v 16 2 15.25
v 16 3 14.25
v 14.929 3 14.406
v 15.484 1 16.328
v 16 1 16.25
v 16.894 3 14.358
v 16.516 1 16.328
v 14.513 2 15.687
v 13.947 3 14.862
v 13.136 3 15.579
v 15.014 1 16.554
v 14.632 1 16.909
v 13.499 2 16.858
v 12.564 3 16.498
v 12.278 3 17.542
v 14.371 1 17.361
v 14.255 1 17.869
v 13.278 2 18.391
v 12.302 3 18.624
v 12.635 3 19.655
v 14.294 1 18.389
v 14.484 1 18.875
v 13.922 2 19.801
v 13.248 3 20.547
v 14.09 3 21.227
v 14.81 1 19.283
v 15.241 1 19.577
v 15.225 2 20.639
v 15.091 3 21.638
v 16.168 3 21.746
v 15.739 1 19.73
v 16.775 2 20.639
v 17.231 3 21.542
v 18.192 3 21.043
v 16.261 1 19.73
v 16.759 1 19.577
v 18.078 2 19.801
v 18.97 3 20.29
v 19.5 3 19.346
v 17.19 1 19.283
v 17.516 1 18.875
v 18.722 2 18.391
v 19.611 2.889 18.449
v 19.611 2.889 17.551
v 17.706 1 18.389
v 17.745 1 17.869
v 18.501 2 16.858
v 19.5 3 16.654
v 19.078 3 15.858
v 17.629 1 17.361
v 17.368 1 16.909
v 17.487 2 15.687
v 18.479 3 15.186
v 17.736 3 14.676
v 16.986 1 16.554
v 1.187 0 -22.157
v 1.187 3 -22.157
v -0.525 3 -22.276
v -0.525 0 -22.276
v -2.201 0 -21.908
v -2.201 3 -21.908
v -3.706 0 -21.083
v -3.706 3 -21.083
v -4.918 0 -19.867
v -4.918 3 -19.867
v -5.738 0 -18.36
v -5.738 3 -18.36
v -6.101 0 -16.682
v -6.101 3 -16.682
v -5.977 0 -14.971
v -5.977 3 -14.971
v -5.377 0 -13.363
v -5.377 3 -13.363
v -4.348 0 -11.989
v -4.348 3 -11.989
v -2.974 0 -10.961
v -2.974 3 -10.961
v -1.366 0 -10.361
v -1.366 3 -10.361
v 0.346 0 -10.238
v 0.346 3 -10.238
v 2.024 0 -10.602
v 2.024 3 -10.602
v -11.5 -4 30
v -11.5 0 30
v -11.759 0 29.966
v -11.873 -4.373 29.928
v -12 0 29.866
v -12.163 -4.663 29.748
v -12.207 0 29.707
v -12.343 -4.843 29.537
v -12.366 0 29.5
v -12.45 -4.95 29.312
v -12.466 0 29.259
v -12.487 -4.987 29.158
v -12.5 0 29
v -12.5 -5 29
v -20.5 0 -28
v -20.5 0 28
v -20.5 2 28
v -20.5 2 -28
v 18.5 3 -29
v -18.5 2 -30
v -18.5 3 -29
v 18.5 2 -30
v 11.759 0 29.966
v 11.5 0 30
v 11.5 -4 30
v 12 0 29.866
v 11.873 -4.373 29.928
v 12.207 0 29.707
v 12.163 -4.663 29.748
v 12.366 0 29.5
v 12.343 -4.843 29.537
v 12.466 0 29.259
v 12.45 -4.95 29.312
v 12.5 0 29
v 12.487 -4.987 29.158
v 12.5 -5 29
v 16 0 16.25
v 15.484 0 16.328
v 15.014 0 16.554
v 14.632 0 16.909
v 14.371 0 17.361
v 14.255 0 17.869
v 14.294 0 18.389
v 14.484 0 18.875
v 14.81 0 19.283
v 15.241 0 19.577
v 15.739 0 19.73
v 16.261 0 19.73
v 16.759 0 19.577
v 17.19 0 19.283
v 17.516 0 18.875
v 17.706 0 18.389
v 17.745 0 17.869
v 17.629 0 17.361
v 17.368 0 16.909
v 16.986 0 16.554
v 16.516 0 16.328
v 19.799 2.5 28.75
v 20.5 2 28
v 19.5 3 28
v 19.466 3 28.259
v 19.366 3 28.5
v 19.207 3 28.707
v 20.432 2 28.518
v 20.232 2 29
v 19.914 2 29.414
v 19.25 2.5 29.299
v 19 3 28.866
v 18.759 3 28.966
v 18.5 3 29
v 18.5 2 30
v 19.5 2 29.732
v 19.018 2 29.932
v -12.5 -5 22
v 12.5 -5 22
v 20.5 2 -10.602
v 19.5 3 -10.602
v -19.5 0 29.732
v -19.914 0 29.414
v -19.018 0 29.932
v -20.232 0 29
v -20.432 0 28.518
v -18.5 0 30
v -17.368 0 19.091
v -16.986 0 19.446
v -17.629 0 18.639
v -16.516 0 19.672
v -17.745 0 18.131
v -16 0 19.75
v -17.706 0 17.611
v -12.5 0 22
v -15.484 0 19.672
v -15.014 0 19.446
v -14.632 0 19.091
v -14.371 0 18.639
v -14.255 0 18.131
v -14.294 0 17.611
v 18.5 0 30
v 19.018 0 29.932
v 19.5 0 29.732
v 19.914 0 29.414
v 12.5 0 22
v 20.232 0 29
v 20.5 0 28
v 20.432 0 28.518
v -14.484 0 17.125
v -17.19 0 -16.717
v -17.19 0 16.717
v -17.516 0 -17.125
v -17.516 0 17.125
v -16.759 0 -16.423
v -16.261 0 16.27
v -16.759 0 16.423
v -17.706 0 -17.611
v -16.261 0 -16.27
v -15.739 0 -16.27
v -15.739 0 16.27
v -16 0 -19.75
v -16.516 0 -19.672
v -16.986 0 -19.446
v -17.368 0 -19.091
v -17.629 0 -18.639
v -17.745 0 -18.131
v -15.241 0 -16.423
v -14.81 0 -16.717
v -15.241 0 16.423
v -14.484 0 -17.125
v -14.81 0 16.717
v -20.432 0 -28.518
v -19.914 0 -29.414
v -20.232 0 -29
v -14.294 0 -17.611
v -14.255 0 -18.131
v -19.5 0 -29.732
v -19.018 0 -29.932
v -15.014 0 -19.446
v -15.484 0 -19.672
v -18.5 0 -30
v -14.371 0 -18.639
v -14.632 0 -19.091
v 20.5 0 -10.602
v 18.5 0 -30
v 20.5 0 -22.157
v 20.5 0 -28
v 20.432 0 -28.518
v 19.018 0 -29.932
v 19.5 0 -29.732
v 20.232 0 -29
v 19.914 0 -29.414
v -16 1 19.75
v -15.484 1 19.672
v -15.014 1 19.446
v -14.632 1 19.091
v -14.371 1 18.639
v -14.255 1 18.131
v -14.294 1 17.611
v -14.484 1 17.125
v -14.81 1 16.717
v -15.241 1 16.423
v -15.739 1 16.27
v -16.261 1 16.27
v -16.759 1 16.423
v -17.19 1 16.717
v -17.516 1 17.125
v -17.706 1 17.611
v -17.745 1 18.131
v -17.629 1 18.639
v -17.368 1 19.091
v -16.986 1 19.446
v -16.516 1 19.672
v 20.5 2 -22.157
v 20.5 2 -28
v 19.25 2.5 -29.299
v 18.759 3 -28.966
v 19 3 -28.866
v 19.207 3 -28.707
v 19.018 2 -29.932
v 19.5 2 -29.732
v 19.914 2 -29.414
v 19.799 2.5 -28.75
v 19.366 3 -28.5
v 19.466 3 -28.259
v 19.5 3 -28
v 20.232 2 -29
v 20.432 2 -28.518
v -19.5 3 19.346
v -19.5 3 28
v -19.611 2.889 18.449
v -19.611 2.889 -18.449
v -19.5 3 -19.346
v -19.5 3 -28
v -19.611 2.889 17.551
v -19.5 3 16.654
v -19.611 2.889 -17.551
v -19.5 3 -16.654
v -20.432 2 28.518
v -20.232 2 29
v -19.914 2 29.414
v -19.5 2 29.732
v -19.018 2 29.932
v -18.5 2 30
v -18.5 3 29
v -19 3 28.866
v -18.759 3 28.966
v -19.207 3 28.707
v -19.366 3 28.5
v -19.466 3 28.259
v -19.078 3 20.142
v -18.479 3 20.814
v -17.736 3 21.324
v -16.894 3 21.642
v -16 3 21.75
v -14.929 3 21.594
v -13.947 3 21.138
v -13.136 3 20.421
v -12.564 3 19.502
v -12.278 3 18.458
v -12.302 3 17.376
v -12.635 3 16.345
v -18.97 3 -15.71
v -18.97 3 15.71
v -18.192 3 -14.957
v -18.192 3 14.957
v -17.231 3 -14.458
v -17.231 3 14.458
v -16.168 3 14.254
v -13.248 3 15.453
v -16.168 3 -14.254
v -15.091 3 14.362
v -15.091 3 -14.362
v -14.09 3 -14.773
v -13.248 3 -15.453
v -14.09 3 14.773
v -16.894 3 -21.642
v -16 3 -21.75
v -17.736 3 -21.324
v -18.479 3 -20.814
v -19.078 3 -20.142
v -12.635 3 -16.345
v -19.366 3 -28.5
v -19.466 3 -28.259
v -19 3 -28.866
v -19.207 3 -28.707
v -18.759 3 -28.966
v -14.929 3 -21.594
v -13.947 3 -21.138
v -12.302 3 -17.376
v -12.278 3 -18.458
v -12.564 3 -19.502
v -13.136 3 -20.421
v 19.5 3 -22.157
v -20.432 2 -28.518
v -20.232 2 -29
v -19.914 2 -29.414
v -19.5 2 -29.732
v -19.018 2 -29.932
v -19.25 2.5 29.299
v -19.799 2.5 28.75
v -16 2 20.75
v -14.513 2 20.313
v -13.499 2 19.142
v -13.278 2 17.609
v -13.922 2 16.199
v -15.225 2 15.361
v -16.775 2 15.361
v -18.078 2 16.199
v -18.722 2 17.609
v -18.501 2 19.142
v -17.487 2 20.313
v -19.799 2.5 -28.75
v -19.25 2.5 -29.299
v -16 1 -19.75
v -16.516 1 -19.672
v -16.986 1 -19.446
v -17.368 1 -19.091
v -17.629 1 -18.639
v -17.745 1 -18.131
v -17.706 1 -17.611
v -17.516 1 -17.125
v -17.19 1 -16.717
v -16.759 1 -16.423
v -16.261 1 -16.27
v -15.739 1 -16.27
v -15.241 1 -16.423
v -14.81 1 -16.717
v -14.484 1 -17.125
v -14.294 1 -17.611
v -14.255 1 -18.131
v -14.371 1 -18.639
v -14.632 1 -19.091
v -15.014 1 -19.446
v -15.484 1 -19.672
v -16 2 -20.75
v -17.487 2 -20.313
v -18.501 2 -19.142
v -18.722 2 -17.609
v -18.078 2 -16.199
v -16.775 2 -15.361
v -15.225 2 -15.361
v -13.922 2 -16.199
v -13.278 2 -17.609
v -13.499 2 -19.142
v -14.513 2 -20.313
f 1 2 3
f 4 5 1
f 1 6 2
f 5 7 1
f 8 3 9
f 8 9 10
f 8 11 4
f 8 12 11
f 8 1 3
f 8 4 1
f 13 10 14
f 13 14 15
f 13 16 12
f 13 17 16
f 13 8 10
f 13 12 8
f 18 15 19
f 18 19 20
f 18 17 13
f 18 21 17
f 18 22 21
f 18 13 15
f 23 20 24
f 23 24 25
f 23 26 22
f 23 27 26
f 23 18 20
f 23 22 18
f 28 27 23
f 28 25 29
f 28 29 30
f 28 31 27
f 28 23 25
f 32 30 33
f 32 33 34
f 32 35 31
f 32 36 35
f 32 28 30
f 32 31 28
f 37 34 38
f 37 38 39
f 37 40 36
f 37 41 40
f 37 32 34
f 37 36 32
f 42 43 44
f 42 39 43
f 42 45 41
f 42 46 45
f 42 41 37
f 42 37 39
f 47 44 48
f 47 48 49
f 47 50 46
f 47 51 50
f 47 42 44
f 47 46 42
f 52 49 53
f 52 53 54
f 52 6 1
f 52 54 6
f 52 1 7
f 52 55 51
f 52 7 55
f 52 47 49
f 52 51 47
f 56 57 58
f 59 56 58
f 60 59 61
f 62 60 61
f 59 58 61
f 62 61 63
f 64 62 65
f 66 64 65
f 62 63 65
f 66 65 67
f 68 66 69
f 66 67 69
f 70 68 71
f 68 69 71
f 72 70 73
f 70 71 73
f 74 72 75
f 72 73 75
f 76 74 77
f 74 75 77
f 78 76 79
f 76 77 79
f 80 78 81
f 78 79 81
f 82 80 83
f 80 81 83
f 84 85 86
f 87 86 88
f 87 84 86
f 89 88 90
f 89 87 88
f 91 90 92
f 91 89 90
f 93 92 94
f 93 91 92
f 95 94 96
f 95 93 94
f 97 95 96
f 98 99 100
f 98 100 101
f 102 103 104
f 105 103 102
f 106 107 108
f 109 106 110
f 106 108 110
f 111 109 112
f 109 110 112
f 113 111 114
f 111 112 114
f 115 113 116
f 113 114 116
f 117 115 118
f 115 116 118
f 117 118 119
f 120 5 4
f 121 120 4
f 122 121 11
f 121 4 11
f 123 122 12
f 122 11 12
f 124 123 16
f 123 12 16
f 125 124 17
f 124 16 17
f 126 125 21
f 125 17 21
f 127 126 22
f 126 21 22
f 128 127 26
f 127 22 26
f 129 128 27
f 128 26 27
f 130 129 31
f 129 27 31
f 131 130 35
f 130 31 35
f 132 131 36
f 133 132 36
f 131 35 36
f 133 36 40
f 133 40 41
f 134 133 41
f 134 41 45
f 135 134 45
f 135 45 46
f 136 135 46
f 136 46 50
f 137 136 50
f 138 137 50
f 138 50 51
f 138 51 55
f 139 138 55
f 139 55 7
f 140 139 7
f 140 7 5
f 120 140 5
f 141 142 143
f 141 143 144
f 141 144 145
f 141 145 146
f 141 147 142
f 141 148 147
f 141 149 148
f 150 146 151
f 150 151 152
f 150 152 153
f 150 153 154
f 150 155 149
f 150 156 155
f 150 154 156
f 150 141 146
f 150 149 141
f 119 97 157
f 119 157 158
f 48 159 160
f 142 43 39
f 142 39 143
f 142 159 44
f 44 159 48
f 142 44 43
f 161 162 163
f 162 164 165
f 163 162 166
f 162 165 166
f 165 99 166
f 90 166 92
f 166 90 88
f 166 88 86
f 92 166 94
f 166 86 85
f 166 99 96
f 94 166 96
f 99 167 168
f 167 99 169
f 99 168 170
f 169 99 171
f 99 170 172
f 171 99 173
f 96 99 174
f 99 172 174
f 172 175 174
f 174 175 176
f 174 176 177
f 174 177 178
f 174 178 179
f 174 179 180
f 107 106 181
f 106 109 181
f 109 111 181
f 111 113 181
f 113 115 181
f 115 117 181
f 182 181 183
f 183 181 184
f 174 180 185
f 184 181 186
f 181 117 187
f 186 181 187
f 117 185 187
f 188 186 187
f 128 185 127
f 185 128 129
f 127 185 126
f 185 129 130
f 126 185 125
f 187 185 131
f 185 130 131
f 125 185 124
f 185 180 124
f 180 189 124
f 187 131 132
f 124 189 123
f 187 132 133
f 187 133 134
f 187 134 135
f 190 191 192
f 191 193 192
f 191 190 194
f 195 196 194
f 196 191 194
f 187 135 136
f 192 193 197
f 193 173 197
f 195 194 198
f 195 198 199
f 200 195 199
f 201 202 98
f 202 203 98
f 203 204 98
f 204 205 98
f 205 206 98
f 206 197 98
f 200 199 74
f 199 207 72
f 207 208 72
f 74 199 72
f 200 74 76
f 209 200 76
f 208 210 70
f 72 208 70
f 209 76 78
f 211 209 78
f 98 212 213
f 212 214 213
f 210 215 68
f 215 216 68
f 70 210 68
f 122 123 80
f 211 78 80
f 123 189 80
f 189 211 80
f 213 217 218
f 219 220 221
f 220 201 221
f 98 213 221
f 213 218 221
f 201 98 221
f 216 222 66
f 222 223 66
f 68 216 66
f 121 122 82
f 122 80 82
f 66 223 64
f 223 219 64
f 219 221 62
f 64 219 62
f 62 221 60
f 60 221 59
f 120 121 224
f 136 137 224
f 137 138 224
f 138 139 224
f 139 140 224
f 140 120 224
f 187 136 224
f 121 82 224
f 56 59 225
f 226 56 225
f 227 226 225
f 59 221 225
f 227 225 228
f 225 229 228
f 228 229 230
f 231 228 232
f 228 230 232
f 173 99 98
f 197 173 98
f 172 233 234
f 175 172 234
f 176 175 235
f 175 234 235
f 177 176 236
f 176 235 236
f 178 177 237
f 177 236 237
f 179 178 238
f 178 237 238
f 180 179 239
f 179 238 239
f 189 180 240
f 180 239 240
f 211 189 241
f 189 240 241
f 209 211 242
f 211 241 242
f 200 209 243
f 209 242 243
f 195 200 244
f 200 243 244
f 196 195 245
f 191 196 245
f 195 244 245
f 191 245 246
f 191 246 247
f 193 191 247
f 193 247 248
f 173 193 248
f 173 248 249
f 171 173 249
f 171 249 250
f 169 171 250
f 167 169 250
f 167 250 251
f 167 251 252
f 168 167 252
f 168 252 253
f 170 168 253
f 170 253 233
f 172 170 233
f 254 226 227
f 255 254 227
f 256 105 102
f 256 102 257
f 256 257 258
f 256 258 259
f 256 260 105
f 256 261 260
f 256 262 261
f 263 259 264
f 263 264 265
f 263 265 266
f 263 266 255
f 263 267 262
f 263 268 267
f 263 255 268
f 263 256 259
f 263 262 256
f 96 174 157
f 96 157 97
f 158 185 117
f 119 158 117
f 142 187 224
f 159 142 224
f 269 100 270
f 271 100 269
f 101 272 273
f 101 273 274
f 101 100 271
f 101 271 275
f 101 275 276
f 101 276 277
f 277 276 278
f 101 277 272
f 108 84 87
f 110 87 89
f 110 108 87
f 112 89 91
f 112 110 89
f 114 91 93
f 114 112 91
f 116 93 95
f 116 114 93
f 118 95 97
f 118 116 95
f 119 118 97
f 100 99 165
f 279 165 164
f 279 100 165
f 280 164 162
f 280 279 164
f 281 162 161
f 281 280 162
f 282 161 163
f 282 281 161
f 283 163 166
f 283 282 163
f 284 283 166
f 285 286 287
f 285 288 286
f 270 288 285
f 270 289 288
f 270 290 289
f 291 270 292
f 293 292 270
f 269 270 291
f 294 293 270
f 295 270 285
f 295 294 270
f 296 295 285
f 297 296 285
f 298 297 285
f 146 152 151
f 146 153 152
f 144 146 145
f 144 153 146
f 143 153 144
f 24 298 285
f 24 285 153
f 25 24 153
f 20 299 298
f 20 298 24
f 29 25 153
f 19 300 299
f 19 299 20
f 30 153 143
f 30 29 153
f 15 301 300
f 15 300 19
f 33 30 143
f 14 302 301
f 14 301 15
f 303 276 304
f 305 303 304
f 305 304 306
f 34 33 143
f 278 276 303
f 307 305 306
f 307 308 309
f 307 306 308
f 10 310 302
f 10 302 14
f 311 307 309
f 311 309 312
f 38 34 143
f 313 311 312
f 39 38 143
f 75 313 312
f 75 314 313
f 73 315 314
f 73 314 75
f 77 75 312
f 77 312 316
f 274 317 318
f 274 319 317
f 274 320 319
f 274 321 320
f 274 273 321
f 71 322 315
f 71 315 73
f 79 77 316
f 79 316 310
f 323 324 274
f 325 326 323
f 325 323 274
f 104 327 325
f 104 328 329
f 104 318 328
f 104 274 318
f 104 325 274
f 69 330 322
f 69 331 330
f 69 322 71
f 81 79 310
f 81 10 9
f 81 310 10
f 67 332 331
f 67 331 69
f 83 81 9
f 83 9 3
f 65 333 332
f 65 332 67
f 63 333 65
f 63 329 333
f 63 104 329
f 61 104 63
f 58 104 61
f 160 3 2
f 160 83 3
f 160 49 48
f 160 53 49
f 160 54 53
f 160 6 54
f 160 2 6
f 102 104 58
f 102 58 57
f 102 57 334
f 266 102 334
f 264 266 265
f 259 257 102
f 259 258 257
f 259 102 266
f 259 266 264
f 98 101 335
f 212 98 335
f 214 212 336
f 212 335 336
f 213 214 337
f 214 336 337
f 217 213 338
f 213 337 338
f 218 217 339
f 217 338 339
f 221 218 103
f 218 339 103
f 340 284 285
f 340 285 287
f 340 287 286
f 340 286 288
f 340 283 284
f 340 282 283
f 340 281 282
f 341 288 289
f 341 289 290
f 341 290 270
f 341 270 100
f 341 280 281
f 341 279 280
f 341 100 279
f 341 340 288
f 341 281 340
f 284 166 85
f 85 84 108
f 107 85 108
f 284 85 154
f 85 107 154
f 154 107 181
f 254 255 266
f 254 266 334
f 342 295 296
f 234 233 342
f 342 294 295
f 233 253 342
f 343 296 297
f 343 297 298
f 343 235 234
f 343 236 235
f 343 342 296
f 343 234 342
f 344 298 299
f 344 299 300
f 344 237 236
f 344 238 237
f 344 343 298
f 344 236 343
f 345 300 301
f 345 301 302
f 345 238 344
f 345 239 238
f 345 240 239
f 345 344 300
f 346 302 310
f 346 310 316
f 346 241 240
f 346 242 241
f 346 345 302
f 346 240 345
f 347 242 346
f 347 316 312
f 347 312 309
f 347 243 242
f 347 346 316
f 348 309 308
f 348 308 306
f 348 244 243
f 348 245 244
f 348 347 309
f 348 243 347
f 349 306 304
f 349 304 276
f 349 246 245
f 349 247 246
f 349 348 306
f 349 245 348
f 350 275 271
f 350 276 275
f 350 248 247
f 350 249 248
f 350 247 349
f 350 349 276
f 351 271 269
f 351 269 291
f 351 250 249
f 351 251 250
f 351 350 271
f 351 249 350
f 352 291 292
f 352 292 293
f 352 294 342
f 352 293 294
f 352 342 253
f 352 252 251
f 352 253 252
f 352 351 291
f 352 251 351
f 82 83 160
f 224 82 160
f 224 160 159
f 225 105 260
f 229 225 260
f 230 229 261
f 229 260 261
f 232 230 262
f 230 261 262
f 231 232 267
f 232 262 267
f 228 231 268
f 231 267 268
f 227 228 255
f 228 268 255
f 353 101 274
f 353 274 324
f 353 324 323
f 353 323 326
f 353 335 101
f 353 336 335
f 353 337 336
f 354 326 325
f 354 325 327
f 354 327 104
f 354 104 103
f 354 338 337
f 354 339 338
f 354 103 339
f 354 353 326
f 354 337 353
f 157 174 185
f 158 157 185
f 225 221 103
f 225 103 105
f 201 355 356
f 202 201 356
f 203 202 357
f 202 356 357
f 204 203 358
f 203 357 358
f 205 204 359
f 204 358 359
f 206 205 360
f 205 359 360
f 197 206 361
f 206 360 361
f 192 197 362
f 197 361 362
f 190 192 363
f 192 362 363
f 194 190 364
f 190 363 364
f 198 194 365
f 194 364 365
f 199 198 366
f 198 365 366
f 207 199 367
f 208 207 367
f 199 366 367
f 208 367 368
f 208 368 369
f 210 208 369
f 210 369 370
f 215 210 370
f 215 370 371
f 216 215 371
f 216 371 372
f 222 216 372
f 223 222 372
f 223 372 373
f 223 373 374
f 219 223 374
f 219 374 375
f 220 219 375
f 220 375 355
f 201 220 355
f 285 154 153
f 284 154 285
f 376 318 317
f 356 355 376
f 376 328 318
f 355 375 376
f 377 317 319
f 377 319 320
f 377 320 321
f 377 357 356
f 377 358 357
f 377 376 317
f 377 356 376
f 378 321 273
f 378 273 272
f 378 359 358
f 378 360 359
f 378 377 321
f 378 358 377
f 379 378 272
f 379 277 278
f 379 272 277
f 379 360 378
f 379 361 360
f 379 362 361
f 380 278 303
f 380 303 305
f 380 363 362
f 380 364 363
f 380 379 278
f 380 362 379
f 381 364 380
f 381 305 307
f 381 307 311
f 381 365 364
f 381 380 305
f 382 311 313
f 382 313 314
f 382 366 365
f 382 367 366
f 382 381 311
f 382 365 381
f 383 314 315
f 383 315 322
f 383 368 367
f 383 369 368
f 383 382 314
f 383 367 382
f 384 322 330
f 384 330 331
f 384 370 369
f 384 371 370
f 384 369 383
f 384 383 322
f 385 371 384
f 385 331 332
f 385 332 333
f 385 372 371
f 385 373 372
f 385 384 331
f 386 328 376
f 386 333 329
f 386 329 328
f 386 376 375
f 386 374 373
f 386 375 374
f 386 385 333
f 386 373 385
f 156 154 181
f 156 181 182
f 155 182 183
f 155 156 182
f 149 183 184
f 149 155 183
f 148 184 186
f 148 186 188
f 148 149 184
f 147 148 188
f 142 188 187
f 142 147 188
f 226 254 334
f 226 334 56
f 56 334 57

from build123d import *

# Parameters (mm, degrees)
SKETCH_1_W          = 41
SKETCH_1_H          = 60
EXTRUDE_1_DEPTH     = 3
SKETCH_2_R          = 1.75
CUT_EXTRUDE_1_DEPTH = 3
FILLET_1_R          = 2
SKETCH_3_W          = 25
SKETCH_3_H          = 8
EXTRUDE_2_DEPTH     = 5
FILLET_2_R          = 1
CHAMFER_2_SIZE      = 1
CHAMFER_1_SIZE      = 2
CUT_EXTRUDE_3_DEPTH = 10


with BuildPart() as part:
    # Эскиз1 → Бобышка-Вытянуть1 (new body)
    with BuildSketch(Plane(origin=(0, 0, 0), x_dir=(1, 0, 0), z_dir=(0, 1, 0))):
        Rectangle(SKETCH_1_W, SKETCH_1_H)
    extrude(amount=EXTRUDE_1_DEPTH)

    # Эскиз2 → Вырез-Вытянуть1 (cut)
    with BuildSketch(Plane(origin=(0, 3, 0), x_dir=(1, 0, 0), z_dir=(0, 1, 0))):
        with Locations(Location((16, 18, 0), (0, 0, 270))):
            Circle(SKETCH_2_R)
        with Locations(Location((16, -18, 0), (0, 0, 90))):
            Circle(SKETCH_2_R)
        with Locations(Location((-16, -18, 0), (0, 0, 270))):
            Circle(SKETCH_2_R)
        with Locations(Location((-16, 18, 0), (0, 0, 90))):
            Circle(SKETCH_2_R)
    extrude(amount=-CUT_EXTRUDE_1_DEPTH, mode=Mode.SUBTRACT)

    # Скругление1
    fillet_1_edges = [part.edges().sort_by_distance(p)[0] for p in [
        (20.5, 1.5, 30),
        (-20.5, 1.5, 30),
        (-20.5, 1.5, -30),
        (20.5, 1.5, -30),
    ]]
    fillet(fillet_1_edges, radius=FILLET_1_R)

    # Эскиз3 → Бобышка-Вытянуть2 (add)
    with BuildSketch(Plane.XZ):
        with Locations((0, 26)):
            Rectangle(SKETCH_3_W, SKETCH_3_H)
    extrude(amount=EXTRUDE_2_DEPTH)

    # Скругление2
    fillet_2_edges = [part.edges().sort_by_distance(p)[0] for p in [
        (12.5, -2.5, 30),
        (-12.5, -2.5, 30),
        (0, -5, 30),
    ]]
    fillet(fillet_2_edges, radius=FILLET_2_R)

    # Фаска2
    chamfer_2_edges = [part.edges().sort_by_distance(p)[0] for p in [
        (0, 3, -30),
        (20.5, 3, 0),
        (-20.5, 3, 0),
        (0, 3, 30),
        (19.914213562, 3, 29.414213562),
        (-19.914213562, 3, 29.414213562),
        (-19.914213562, 3, -29.414213562),
        (19.914213562, 3, -29.414213562),
    ]]
    chamfer(chamfer_2_edges, length=CHAMFER_2_SIZE)

    # Фаска1
    # the kernel refuses this chamfer: 2 mm, written as the material it takes off along each edge
    with BuildSketch(Plane(origin=(-16, 3, -18), x_dir=(0, 0, -1), z_dir=(1, 0, 0))) as chamfer_1_piece_1:
        Polygon((1.75 + CHAMFER_1_SIZE, 0), (1.75, -CHAMFER_1_SIZE), (1.75, 0), align=None)
    revolve(axis=Axis((-16, 3, -18), (0, 1, 0)), mode=Mode.SUBTRACT)
    with BuildSketch(Plane(origin=(-16, 3, 18), x_dir=(0, 0, 1), z_dir=(-1, 0, 0))) as chamfer_1_piece_2:
        Polygon((1.75 + CHAMFER_1_SIZE, 0), (1.75, -CHAMFER_1_SIZE), (1.75, 0), align=None)
    revolve(axis=Axis((-16, 3, 18), (0, 1, 0)), mode=Mode.SUBTRACT)
    with BuildSketch(Plane(origin=(16, 3, 18), x_dir=(0, 0, -1), z_dir=(1, 0, 0))) as chamfer_1_piece_3:
        Polygon((1.75 + CHAMFER_1_SIZE, 0), (1.75, -CHAMFER_1_SIZE), (1.75, 0), align=None)
    revolve(axis=Axis((16, 3, 18), (0, 1, 0)), mode=Mode.SUBTRACT)
    with BuildSketch(Plane(origin=(16, 3, -18), x_dir=(0, 0, 1), z_dir=(-1, 0, 0))) as chamfer_1_piece_4:
        Polygon((1.75 + CHAMFER_1_SIZE, 0), (1.75, -CHAMFER_1_SIZE), (1.75, 0), align=None)
    revolve(axis=Axis((16, 3, -18), (0, 1, 0)), mode=Mode.SUBTRACT)

    # Эскиз4 → Вырез-Вытянуть3 (cut)
    with BuildSketch(Plane(origin=(0, 3, 0), x_dir=(1, 0, 0), z_dir=(0, 1, 0))):
        with BuildLine():
            Line((23.418596888, 22.157492631), (1.187361352, 22.157492631))
            ThreePointArc((1.187361352, 22.157492631), (-6.100332896, 15.822023301), (2.023513442, 10.60169958))
            Line((2.023513442, 10.60169958), (23.418596888, 10.60169958))
            Line((23.418596888, 10.60169958), (23.418596888, 22.157492631))
        make_face()
    extrude(amount=-CUT_EXTRUDE_3_DEPTH, mode=Mode.SUBTRACT)


solid = part.part
